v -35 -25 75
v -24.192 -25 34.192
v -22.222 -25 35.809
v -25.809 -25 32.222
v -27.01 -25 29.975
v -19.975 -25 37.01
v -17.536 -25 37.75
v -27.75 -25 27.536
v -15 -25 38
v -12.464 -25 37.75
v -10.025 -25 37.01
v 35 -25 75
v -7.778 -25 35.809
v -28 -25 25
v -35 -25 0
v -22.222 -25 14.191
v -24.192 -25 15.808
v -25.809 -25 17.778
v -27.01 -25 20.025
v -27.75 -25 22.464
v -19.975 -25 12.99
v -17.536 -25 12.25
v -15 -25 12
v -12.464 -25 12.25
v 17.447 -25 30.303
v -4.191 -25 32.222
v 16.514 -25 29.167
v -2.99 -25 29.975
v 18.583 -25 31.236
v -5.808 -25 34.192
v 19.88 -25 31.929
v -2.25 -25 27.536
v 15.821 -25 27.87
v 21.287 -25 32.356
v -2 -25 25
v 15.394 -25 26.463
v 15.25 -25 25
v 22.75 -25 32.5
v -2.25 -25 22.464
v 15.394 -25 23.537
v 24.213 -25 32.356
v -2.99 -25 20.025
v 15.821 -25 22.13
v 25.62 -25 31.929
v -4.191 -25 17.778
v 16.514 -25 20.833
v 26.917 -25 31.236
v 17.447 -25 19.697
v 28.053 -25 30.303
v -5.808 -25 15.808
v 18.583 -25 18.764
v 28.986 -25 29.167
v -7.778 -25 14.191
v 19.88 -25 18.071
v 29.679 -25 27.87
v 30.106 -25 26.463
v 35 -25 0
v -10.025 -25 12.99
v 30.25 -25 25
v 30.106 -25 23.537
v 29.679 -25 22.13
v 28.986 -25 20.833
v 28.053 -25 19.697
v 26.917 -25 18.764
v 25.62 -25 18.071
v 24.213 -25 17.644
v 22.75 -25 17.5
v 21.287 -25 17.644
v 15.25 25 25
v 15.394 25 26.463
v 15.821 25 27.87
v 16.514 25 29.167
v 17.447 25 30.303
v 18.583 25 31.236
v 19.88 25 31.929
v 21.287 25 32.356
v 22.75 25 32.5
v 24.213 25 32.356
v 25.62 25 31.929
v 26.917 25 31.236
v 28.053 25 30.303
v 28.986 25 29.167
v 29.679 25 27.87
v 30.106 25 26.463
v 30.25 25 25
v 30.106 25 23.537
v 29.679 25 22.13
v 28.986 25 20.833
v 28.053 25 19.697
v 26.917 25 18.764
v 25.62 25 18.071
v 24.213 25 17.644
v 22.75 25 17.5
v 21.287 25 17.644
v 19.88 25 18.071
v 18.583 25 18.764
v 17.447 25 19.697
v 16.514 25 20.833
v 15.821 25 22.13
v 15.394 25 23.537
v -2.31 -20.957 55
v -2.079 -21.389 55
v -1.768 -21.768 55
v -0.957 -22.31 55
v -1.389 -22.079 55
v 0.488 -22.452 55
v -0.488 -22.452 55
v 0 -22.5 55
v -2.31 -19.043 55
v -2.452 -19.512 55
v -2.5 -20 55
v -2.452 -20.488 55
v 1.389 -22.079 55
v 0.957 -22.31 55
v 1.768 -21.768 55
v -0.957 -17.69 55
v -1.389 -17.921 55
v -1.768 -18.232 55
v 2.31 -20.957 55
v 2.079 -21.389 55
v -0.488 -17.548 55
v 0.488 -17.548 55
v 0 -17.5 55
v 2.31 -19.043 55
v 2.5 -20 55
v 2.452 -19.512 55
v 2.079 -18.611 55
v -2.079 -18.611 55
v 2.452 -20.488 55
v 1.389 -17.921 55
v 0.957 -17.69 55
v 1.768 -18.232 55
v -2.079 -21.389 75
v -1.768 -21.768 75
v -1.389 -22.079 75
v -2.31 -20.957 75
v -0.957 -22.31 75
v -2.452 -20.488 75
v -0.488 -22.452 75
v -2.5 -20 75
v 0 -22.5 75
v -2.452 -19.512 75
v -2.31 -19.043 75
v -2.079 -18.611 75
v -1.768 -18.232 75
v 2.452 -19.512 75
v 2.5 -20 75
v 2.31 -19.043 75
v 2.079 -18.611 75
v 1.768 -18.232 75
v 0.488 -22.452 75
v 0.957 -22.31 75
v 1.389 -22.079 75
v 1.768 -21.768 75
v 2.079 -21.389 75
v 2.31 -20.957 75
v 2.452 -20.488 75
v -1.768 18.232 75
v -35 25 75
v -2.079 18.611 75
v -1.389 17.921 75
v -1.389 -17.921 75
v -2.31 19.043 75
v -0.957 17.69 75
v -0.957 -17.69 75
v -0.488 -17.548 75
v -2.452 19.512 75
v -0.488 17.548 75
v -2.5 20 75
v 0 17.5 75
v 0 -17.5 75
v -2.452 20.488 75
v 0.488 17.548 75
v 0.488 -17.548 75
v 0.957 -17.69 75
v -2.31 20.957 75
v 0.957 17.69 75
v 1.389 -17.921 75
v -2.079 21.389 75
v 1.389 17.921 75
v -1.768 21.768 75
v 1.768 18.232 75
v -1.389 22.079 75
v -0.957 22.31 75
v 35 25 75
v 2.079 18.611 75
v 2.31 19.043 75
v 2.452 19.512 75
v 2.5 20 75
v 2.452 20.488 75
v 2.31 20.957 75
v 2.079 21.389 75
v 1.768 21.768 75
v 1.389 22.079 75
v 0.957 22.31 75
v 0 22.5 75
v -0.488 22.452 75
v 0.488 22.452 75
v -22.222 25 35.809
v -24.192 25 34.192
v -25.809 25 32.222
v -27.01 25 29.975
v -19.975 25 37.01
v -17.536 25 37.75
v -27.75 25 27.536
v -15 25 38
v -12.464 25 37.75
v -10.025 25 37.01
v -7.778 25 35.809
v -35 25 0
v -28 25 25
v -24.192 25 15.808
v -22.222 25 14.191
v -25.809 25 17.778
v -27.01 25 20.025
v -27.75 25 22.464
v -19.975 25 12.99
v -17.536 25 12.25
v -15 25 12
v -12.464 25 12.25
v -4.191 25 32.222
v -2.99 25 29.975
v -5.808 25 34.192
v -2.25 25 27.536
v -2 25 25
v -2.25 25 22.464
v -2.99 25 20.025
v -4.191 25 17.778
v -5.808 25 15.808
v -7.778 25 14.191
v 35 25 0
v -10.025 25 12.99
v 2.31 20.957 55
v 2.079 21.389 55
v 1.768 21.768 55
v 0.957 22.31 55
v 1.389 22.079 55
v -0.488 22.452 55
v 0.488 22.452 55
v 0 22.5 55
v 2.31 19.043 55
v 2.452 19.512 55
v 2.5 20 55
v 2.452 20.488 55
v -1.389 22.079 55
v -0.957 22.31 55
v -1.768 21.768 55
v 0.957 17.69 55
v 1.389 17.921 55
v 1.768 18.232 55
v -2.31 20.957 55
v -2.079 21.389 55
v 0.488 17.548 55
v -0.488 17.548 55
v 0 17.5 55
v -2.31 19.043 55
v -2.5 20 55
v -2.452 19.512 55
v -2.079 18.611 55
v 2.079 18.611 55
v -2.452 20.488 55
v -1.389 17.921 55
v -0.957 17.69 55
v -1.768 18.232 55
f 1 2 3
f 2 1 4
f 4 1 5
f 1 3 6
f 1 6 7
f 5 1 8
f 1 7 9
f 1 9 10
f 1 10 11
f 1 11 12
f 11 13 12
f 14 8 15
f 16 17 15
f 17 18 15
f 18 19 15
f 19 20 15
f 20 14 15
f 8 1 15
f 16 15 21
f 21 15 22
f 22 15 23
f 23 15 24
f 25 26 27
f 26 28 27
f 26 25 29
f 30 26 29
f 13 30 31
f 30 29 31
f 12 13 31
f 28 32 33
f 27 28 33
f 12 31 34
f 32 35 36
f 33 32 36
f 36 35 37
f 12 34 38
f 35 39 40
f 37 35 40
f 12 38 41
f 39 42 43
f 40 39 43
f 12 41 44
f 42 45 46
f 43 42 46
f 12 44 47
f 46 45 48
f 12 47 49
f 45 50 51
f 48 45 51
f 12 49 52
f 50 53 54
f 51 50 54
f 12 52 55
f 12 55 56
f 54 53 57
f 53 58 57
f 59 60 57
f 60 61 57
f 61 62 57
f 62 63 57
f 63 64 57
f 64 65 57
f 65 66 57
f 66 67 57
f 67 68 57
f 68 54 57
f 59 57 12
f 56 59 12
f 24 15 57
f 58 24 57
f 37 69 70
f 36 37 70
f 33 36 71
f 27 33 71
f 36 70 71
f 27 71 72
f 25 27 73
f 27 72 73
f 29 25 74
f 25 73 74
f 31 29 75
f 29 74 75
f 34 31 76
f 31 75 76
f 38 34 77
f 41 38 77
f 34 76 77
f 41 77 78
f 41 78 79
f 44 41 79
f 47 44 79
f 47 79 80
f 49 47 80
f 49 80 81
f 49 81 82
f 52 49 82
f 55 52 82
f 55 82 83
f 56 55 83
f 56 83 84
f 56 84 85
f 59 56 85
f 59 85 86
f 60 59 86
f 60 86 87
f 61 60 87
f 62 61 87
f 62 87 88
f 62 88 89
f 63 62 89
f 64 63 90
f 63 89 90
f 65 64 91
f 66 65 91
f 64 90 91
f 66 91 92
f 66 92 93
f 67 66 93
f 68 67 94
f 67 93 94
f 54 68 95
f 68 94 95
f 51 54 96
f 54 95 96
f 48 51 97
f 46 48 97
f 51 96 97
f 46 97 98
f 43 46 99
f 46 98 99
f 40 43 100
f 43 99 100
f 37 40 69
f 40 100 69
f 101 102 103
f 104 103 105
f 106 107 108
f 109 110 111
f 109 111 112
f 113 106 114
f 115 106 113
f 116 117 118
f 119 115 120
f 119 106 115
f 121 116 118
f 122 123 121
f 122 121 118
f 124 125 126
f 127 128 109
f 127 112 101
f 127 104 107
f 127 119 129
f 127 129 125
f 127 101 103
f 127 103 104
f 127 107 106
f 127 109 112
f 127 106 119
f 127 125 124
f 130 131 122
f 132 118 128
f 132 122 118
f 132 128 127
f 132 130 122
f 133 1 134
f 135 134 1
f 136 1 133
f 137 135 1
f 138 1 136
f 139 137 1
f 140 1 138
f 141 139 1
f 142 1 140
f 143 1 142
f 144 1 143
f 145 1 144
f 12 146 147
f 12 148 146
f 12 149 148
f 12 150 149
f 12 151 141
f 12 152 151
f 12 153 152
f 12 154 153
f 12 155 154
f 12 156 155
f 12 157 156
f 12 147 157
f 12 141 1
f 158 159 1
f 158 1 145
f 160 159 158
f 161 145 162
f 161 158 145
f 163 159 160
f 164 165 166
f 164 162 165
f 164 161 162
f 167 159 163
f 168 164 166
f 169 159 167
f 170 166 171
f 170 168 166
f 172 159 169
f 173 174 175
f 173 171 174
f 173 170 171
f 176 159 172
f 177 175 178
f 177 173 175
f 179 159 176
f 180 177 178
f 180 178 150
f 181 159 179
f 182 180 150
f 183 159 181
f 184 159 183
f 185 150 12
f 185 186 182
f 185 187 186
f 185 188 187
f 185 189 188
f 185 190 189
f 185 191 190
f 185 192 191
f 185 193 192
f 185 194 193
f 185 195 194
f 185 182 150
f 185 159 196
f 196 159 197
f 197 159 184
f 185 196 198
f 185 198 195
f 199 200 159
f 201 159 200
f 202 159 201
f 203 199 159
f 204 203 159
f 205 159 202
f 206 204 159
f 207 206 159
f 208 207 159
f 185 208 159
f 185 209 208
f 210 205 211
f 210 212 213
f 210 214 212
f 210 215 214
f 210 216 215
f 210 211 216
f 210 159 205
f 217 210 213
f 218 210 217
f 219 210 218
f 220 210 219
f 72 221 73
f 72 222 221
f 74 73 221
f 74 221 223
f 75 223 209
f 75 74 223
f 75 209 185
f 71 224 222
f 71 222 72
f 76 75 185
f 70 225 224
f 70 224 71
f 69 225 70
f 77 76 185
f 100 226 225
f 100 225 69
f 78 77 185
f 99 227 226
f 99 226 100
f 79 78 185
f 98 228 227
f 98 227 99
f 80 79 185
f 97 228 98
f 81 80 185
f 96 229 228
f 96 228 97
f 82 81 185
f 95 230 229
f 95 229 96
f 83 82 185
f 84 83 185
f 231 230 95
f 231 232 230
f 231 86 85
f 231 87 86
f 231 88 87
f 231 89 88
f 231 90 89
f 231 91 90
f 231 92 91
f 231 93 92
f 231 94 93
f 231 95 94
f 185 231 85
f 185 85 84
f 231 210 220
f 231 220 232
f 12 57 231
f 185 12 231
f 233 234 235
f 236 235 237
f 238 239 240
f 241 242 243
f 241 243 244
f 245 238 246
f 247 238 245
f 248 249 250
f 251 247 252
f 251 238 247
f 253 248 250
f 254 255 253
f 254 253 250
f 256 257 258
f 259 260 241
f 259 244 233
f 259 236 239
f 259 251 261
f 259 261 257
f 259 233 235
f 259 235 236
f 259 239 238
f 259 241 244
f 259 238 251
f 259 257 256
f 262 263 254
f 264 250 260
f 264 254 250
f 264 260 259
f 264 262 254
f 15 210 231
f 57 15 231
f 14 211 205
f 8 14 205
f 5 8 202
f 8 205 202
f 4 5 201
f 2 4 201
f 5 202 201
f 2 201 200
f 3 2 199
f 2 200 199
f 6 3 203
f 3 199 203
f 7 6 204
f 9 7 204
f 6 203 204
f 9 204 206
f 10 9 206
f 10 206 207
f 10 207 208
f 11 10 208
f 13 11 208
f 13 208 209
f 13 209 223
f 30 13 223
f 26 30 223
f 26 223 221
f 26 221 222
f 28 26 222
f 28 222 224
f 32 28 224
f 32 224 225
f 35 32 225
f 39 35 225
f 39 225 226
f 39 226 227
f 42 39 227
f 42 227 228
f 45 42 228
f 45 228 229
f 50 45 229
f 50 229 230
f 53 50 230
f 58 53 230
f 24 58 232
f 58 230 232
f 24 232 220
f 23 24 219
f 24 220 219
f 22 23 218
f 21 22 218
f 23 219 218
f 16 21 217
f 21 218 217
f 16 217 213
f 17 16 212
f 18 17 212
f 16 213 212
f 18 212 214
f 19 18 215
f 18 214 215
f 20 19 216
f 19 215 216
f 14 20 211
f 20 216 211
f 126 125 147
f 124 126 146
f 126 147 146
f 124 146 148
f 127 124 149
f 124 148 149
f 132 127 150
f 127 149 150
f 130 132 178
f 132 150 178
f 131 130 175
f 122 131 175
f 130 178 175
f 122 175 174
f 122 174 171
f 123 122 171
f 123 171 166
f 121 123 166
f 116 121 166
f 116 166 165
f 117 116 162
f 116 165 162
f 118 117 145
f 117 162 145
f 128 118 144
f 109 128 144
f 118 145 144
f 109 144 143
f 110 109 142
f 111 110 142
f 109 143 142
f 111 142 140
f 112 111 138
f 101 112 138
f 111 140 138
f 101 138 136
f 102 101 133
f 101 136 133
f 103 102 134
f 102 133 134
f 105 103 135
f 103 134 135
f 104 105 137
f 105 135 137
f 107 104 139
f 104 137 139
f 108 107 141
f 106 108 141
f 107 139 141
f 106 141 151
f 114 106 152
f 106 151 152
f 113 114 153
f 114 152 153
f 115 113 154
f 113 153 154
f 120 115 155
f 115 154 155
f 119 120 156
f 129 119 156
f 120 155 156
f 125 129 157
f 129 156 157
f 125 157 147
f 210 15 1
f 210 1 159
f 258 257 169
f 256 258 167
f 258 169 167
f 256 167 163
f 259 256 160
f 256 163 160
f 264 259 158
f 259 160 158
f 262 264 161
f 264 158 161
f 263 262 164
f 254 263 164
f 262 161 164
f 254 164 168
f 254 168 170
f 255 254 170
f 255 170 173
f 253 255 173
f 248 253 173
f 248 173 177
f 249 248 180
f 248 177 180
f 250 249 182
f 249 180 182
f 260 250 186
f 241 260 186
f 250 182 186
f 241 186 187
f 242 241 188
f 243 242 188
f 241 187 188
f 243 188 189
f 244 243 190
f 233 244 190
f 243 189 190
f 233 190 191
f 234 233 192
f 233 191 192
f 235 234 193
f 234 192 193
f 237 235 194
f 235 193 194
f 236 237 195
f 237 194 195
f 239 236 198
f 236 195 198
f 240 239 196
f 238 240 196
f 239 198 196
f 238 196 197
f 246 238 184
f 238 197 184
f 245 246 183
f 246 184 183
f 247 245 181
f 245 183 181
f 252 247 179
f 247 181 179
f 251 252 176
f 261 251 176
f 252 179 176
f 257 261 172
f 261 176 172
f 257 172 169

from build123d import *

# Parameters (mm, degrees)
SKETCH1_W           = 70
SKETCH1_H           = 50
BOSS_EXTRUDE1_DEPTH = 75
CUT_EXTRUDE1_REACH  = 98.695
SKETCH2_R           = 7.5
SKETCH2_R_2         = 13
SKETCH3_R           = 2.5
CUT_EXTRUDE2_DEPTH  = 20


with BuildPart() as part:
    # Sketch1 → Boss-Extrude1 (new body)
    with BuildSketch(Plane.XY):
        Rectangle(SKETCH1_W, SKETCH1_H)
    extrude(amount=BOSS_EXTRUDE1_DEPTH)

    # Sketch2 → Cut-Extrude1 (cut, up to next)
    with BuildSketch(Plane(origin=(0, 25, 0), x_dir=(1, 0, 0), z_dir=(0, 1, 0)), mode=Mode.PRIVATE) as cut_extrude1_sk1:
        with Locations(Location((22.75, -25, 0), (0, 0, 180))):
            Circle(SKETCH2_R)
    cut_extrude1_tool1 = extrude(cut_extrude1_sk1.sketch, amount=-CUT_EXTRUDE1_REACH, mode=Mode.PRIVATE) & part.part
    # Sketch2 → Cut-Extrude1 (cut, up to next)
    with BuildSketch(Plane(origin=(0, 25, 0), x_dir=(1, 0, 0), z_dir=(0, 1, 0)), mode=Mode.PRIVATE) as cut_extrude1_sk2:
        with Locations(Location((-15, -25, 0), (0, 0, 180))):
            Circle(SKETCH2_R_2)
    cut_extrude1_tool2 = extrude(cut_extrude1_sk2.sketch, amount=-CUT_EXTRUDE1_REACH, mode=Mode.PRIVATE) & part.part
    add(cut_extrude1_tool1.solids().sort_by_distance((22.75, 25, 25))[0], mode=Mode.SUBTRACT)
    add(cut_extrude1_tool2.solids().sort_by_distance((-15, 25, 25))[0], mode=Mode.SUBTRACT)

    # Sketch3 → Cut-Extrude2 (cut)
    with BuildSketch(Plane.XY.offset(75)):
        with Locations((0, -20)):
            Circle(SKETCH3_R)
        with Locations(Location((0, 20, 0), (0, 0, 180))):
            Circle(SKETCH3_R)
    extrude(amount=-CUT_EXTRUDE2_DEPTH, mode=Mode.SUBTRACT)


solid = part.part
